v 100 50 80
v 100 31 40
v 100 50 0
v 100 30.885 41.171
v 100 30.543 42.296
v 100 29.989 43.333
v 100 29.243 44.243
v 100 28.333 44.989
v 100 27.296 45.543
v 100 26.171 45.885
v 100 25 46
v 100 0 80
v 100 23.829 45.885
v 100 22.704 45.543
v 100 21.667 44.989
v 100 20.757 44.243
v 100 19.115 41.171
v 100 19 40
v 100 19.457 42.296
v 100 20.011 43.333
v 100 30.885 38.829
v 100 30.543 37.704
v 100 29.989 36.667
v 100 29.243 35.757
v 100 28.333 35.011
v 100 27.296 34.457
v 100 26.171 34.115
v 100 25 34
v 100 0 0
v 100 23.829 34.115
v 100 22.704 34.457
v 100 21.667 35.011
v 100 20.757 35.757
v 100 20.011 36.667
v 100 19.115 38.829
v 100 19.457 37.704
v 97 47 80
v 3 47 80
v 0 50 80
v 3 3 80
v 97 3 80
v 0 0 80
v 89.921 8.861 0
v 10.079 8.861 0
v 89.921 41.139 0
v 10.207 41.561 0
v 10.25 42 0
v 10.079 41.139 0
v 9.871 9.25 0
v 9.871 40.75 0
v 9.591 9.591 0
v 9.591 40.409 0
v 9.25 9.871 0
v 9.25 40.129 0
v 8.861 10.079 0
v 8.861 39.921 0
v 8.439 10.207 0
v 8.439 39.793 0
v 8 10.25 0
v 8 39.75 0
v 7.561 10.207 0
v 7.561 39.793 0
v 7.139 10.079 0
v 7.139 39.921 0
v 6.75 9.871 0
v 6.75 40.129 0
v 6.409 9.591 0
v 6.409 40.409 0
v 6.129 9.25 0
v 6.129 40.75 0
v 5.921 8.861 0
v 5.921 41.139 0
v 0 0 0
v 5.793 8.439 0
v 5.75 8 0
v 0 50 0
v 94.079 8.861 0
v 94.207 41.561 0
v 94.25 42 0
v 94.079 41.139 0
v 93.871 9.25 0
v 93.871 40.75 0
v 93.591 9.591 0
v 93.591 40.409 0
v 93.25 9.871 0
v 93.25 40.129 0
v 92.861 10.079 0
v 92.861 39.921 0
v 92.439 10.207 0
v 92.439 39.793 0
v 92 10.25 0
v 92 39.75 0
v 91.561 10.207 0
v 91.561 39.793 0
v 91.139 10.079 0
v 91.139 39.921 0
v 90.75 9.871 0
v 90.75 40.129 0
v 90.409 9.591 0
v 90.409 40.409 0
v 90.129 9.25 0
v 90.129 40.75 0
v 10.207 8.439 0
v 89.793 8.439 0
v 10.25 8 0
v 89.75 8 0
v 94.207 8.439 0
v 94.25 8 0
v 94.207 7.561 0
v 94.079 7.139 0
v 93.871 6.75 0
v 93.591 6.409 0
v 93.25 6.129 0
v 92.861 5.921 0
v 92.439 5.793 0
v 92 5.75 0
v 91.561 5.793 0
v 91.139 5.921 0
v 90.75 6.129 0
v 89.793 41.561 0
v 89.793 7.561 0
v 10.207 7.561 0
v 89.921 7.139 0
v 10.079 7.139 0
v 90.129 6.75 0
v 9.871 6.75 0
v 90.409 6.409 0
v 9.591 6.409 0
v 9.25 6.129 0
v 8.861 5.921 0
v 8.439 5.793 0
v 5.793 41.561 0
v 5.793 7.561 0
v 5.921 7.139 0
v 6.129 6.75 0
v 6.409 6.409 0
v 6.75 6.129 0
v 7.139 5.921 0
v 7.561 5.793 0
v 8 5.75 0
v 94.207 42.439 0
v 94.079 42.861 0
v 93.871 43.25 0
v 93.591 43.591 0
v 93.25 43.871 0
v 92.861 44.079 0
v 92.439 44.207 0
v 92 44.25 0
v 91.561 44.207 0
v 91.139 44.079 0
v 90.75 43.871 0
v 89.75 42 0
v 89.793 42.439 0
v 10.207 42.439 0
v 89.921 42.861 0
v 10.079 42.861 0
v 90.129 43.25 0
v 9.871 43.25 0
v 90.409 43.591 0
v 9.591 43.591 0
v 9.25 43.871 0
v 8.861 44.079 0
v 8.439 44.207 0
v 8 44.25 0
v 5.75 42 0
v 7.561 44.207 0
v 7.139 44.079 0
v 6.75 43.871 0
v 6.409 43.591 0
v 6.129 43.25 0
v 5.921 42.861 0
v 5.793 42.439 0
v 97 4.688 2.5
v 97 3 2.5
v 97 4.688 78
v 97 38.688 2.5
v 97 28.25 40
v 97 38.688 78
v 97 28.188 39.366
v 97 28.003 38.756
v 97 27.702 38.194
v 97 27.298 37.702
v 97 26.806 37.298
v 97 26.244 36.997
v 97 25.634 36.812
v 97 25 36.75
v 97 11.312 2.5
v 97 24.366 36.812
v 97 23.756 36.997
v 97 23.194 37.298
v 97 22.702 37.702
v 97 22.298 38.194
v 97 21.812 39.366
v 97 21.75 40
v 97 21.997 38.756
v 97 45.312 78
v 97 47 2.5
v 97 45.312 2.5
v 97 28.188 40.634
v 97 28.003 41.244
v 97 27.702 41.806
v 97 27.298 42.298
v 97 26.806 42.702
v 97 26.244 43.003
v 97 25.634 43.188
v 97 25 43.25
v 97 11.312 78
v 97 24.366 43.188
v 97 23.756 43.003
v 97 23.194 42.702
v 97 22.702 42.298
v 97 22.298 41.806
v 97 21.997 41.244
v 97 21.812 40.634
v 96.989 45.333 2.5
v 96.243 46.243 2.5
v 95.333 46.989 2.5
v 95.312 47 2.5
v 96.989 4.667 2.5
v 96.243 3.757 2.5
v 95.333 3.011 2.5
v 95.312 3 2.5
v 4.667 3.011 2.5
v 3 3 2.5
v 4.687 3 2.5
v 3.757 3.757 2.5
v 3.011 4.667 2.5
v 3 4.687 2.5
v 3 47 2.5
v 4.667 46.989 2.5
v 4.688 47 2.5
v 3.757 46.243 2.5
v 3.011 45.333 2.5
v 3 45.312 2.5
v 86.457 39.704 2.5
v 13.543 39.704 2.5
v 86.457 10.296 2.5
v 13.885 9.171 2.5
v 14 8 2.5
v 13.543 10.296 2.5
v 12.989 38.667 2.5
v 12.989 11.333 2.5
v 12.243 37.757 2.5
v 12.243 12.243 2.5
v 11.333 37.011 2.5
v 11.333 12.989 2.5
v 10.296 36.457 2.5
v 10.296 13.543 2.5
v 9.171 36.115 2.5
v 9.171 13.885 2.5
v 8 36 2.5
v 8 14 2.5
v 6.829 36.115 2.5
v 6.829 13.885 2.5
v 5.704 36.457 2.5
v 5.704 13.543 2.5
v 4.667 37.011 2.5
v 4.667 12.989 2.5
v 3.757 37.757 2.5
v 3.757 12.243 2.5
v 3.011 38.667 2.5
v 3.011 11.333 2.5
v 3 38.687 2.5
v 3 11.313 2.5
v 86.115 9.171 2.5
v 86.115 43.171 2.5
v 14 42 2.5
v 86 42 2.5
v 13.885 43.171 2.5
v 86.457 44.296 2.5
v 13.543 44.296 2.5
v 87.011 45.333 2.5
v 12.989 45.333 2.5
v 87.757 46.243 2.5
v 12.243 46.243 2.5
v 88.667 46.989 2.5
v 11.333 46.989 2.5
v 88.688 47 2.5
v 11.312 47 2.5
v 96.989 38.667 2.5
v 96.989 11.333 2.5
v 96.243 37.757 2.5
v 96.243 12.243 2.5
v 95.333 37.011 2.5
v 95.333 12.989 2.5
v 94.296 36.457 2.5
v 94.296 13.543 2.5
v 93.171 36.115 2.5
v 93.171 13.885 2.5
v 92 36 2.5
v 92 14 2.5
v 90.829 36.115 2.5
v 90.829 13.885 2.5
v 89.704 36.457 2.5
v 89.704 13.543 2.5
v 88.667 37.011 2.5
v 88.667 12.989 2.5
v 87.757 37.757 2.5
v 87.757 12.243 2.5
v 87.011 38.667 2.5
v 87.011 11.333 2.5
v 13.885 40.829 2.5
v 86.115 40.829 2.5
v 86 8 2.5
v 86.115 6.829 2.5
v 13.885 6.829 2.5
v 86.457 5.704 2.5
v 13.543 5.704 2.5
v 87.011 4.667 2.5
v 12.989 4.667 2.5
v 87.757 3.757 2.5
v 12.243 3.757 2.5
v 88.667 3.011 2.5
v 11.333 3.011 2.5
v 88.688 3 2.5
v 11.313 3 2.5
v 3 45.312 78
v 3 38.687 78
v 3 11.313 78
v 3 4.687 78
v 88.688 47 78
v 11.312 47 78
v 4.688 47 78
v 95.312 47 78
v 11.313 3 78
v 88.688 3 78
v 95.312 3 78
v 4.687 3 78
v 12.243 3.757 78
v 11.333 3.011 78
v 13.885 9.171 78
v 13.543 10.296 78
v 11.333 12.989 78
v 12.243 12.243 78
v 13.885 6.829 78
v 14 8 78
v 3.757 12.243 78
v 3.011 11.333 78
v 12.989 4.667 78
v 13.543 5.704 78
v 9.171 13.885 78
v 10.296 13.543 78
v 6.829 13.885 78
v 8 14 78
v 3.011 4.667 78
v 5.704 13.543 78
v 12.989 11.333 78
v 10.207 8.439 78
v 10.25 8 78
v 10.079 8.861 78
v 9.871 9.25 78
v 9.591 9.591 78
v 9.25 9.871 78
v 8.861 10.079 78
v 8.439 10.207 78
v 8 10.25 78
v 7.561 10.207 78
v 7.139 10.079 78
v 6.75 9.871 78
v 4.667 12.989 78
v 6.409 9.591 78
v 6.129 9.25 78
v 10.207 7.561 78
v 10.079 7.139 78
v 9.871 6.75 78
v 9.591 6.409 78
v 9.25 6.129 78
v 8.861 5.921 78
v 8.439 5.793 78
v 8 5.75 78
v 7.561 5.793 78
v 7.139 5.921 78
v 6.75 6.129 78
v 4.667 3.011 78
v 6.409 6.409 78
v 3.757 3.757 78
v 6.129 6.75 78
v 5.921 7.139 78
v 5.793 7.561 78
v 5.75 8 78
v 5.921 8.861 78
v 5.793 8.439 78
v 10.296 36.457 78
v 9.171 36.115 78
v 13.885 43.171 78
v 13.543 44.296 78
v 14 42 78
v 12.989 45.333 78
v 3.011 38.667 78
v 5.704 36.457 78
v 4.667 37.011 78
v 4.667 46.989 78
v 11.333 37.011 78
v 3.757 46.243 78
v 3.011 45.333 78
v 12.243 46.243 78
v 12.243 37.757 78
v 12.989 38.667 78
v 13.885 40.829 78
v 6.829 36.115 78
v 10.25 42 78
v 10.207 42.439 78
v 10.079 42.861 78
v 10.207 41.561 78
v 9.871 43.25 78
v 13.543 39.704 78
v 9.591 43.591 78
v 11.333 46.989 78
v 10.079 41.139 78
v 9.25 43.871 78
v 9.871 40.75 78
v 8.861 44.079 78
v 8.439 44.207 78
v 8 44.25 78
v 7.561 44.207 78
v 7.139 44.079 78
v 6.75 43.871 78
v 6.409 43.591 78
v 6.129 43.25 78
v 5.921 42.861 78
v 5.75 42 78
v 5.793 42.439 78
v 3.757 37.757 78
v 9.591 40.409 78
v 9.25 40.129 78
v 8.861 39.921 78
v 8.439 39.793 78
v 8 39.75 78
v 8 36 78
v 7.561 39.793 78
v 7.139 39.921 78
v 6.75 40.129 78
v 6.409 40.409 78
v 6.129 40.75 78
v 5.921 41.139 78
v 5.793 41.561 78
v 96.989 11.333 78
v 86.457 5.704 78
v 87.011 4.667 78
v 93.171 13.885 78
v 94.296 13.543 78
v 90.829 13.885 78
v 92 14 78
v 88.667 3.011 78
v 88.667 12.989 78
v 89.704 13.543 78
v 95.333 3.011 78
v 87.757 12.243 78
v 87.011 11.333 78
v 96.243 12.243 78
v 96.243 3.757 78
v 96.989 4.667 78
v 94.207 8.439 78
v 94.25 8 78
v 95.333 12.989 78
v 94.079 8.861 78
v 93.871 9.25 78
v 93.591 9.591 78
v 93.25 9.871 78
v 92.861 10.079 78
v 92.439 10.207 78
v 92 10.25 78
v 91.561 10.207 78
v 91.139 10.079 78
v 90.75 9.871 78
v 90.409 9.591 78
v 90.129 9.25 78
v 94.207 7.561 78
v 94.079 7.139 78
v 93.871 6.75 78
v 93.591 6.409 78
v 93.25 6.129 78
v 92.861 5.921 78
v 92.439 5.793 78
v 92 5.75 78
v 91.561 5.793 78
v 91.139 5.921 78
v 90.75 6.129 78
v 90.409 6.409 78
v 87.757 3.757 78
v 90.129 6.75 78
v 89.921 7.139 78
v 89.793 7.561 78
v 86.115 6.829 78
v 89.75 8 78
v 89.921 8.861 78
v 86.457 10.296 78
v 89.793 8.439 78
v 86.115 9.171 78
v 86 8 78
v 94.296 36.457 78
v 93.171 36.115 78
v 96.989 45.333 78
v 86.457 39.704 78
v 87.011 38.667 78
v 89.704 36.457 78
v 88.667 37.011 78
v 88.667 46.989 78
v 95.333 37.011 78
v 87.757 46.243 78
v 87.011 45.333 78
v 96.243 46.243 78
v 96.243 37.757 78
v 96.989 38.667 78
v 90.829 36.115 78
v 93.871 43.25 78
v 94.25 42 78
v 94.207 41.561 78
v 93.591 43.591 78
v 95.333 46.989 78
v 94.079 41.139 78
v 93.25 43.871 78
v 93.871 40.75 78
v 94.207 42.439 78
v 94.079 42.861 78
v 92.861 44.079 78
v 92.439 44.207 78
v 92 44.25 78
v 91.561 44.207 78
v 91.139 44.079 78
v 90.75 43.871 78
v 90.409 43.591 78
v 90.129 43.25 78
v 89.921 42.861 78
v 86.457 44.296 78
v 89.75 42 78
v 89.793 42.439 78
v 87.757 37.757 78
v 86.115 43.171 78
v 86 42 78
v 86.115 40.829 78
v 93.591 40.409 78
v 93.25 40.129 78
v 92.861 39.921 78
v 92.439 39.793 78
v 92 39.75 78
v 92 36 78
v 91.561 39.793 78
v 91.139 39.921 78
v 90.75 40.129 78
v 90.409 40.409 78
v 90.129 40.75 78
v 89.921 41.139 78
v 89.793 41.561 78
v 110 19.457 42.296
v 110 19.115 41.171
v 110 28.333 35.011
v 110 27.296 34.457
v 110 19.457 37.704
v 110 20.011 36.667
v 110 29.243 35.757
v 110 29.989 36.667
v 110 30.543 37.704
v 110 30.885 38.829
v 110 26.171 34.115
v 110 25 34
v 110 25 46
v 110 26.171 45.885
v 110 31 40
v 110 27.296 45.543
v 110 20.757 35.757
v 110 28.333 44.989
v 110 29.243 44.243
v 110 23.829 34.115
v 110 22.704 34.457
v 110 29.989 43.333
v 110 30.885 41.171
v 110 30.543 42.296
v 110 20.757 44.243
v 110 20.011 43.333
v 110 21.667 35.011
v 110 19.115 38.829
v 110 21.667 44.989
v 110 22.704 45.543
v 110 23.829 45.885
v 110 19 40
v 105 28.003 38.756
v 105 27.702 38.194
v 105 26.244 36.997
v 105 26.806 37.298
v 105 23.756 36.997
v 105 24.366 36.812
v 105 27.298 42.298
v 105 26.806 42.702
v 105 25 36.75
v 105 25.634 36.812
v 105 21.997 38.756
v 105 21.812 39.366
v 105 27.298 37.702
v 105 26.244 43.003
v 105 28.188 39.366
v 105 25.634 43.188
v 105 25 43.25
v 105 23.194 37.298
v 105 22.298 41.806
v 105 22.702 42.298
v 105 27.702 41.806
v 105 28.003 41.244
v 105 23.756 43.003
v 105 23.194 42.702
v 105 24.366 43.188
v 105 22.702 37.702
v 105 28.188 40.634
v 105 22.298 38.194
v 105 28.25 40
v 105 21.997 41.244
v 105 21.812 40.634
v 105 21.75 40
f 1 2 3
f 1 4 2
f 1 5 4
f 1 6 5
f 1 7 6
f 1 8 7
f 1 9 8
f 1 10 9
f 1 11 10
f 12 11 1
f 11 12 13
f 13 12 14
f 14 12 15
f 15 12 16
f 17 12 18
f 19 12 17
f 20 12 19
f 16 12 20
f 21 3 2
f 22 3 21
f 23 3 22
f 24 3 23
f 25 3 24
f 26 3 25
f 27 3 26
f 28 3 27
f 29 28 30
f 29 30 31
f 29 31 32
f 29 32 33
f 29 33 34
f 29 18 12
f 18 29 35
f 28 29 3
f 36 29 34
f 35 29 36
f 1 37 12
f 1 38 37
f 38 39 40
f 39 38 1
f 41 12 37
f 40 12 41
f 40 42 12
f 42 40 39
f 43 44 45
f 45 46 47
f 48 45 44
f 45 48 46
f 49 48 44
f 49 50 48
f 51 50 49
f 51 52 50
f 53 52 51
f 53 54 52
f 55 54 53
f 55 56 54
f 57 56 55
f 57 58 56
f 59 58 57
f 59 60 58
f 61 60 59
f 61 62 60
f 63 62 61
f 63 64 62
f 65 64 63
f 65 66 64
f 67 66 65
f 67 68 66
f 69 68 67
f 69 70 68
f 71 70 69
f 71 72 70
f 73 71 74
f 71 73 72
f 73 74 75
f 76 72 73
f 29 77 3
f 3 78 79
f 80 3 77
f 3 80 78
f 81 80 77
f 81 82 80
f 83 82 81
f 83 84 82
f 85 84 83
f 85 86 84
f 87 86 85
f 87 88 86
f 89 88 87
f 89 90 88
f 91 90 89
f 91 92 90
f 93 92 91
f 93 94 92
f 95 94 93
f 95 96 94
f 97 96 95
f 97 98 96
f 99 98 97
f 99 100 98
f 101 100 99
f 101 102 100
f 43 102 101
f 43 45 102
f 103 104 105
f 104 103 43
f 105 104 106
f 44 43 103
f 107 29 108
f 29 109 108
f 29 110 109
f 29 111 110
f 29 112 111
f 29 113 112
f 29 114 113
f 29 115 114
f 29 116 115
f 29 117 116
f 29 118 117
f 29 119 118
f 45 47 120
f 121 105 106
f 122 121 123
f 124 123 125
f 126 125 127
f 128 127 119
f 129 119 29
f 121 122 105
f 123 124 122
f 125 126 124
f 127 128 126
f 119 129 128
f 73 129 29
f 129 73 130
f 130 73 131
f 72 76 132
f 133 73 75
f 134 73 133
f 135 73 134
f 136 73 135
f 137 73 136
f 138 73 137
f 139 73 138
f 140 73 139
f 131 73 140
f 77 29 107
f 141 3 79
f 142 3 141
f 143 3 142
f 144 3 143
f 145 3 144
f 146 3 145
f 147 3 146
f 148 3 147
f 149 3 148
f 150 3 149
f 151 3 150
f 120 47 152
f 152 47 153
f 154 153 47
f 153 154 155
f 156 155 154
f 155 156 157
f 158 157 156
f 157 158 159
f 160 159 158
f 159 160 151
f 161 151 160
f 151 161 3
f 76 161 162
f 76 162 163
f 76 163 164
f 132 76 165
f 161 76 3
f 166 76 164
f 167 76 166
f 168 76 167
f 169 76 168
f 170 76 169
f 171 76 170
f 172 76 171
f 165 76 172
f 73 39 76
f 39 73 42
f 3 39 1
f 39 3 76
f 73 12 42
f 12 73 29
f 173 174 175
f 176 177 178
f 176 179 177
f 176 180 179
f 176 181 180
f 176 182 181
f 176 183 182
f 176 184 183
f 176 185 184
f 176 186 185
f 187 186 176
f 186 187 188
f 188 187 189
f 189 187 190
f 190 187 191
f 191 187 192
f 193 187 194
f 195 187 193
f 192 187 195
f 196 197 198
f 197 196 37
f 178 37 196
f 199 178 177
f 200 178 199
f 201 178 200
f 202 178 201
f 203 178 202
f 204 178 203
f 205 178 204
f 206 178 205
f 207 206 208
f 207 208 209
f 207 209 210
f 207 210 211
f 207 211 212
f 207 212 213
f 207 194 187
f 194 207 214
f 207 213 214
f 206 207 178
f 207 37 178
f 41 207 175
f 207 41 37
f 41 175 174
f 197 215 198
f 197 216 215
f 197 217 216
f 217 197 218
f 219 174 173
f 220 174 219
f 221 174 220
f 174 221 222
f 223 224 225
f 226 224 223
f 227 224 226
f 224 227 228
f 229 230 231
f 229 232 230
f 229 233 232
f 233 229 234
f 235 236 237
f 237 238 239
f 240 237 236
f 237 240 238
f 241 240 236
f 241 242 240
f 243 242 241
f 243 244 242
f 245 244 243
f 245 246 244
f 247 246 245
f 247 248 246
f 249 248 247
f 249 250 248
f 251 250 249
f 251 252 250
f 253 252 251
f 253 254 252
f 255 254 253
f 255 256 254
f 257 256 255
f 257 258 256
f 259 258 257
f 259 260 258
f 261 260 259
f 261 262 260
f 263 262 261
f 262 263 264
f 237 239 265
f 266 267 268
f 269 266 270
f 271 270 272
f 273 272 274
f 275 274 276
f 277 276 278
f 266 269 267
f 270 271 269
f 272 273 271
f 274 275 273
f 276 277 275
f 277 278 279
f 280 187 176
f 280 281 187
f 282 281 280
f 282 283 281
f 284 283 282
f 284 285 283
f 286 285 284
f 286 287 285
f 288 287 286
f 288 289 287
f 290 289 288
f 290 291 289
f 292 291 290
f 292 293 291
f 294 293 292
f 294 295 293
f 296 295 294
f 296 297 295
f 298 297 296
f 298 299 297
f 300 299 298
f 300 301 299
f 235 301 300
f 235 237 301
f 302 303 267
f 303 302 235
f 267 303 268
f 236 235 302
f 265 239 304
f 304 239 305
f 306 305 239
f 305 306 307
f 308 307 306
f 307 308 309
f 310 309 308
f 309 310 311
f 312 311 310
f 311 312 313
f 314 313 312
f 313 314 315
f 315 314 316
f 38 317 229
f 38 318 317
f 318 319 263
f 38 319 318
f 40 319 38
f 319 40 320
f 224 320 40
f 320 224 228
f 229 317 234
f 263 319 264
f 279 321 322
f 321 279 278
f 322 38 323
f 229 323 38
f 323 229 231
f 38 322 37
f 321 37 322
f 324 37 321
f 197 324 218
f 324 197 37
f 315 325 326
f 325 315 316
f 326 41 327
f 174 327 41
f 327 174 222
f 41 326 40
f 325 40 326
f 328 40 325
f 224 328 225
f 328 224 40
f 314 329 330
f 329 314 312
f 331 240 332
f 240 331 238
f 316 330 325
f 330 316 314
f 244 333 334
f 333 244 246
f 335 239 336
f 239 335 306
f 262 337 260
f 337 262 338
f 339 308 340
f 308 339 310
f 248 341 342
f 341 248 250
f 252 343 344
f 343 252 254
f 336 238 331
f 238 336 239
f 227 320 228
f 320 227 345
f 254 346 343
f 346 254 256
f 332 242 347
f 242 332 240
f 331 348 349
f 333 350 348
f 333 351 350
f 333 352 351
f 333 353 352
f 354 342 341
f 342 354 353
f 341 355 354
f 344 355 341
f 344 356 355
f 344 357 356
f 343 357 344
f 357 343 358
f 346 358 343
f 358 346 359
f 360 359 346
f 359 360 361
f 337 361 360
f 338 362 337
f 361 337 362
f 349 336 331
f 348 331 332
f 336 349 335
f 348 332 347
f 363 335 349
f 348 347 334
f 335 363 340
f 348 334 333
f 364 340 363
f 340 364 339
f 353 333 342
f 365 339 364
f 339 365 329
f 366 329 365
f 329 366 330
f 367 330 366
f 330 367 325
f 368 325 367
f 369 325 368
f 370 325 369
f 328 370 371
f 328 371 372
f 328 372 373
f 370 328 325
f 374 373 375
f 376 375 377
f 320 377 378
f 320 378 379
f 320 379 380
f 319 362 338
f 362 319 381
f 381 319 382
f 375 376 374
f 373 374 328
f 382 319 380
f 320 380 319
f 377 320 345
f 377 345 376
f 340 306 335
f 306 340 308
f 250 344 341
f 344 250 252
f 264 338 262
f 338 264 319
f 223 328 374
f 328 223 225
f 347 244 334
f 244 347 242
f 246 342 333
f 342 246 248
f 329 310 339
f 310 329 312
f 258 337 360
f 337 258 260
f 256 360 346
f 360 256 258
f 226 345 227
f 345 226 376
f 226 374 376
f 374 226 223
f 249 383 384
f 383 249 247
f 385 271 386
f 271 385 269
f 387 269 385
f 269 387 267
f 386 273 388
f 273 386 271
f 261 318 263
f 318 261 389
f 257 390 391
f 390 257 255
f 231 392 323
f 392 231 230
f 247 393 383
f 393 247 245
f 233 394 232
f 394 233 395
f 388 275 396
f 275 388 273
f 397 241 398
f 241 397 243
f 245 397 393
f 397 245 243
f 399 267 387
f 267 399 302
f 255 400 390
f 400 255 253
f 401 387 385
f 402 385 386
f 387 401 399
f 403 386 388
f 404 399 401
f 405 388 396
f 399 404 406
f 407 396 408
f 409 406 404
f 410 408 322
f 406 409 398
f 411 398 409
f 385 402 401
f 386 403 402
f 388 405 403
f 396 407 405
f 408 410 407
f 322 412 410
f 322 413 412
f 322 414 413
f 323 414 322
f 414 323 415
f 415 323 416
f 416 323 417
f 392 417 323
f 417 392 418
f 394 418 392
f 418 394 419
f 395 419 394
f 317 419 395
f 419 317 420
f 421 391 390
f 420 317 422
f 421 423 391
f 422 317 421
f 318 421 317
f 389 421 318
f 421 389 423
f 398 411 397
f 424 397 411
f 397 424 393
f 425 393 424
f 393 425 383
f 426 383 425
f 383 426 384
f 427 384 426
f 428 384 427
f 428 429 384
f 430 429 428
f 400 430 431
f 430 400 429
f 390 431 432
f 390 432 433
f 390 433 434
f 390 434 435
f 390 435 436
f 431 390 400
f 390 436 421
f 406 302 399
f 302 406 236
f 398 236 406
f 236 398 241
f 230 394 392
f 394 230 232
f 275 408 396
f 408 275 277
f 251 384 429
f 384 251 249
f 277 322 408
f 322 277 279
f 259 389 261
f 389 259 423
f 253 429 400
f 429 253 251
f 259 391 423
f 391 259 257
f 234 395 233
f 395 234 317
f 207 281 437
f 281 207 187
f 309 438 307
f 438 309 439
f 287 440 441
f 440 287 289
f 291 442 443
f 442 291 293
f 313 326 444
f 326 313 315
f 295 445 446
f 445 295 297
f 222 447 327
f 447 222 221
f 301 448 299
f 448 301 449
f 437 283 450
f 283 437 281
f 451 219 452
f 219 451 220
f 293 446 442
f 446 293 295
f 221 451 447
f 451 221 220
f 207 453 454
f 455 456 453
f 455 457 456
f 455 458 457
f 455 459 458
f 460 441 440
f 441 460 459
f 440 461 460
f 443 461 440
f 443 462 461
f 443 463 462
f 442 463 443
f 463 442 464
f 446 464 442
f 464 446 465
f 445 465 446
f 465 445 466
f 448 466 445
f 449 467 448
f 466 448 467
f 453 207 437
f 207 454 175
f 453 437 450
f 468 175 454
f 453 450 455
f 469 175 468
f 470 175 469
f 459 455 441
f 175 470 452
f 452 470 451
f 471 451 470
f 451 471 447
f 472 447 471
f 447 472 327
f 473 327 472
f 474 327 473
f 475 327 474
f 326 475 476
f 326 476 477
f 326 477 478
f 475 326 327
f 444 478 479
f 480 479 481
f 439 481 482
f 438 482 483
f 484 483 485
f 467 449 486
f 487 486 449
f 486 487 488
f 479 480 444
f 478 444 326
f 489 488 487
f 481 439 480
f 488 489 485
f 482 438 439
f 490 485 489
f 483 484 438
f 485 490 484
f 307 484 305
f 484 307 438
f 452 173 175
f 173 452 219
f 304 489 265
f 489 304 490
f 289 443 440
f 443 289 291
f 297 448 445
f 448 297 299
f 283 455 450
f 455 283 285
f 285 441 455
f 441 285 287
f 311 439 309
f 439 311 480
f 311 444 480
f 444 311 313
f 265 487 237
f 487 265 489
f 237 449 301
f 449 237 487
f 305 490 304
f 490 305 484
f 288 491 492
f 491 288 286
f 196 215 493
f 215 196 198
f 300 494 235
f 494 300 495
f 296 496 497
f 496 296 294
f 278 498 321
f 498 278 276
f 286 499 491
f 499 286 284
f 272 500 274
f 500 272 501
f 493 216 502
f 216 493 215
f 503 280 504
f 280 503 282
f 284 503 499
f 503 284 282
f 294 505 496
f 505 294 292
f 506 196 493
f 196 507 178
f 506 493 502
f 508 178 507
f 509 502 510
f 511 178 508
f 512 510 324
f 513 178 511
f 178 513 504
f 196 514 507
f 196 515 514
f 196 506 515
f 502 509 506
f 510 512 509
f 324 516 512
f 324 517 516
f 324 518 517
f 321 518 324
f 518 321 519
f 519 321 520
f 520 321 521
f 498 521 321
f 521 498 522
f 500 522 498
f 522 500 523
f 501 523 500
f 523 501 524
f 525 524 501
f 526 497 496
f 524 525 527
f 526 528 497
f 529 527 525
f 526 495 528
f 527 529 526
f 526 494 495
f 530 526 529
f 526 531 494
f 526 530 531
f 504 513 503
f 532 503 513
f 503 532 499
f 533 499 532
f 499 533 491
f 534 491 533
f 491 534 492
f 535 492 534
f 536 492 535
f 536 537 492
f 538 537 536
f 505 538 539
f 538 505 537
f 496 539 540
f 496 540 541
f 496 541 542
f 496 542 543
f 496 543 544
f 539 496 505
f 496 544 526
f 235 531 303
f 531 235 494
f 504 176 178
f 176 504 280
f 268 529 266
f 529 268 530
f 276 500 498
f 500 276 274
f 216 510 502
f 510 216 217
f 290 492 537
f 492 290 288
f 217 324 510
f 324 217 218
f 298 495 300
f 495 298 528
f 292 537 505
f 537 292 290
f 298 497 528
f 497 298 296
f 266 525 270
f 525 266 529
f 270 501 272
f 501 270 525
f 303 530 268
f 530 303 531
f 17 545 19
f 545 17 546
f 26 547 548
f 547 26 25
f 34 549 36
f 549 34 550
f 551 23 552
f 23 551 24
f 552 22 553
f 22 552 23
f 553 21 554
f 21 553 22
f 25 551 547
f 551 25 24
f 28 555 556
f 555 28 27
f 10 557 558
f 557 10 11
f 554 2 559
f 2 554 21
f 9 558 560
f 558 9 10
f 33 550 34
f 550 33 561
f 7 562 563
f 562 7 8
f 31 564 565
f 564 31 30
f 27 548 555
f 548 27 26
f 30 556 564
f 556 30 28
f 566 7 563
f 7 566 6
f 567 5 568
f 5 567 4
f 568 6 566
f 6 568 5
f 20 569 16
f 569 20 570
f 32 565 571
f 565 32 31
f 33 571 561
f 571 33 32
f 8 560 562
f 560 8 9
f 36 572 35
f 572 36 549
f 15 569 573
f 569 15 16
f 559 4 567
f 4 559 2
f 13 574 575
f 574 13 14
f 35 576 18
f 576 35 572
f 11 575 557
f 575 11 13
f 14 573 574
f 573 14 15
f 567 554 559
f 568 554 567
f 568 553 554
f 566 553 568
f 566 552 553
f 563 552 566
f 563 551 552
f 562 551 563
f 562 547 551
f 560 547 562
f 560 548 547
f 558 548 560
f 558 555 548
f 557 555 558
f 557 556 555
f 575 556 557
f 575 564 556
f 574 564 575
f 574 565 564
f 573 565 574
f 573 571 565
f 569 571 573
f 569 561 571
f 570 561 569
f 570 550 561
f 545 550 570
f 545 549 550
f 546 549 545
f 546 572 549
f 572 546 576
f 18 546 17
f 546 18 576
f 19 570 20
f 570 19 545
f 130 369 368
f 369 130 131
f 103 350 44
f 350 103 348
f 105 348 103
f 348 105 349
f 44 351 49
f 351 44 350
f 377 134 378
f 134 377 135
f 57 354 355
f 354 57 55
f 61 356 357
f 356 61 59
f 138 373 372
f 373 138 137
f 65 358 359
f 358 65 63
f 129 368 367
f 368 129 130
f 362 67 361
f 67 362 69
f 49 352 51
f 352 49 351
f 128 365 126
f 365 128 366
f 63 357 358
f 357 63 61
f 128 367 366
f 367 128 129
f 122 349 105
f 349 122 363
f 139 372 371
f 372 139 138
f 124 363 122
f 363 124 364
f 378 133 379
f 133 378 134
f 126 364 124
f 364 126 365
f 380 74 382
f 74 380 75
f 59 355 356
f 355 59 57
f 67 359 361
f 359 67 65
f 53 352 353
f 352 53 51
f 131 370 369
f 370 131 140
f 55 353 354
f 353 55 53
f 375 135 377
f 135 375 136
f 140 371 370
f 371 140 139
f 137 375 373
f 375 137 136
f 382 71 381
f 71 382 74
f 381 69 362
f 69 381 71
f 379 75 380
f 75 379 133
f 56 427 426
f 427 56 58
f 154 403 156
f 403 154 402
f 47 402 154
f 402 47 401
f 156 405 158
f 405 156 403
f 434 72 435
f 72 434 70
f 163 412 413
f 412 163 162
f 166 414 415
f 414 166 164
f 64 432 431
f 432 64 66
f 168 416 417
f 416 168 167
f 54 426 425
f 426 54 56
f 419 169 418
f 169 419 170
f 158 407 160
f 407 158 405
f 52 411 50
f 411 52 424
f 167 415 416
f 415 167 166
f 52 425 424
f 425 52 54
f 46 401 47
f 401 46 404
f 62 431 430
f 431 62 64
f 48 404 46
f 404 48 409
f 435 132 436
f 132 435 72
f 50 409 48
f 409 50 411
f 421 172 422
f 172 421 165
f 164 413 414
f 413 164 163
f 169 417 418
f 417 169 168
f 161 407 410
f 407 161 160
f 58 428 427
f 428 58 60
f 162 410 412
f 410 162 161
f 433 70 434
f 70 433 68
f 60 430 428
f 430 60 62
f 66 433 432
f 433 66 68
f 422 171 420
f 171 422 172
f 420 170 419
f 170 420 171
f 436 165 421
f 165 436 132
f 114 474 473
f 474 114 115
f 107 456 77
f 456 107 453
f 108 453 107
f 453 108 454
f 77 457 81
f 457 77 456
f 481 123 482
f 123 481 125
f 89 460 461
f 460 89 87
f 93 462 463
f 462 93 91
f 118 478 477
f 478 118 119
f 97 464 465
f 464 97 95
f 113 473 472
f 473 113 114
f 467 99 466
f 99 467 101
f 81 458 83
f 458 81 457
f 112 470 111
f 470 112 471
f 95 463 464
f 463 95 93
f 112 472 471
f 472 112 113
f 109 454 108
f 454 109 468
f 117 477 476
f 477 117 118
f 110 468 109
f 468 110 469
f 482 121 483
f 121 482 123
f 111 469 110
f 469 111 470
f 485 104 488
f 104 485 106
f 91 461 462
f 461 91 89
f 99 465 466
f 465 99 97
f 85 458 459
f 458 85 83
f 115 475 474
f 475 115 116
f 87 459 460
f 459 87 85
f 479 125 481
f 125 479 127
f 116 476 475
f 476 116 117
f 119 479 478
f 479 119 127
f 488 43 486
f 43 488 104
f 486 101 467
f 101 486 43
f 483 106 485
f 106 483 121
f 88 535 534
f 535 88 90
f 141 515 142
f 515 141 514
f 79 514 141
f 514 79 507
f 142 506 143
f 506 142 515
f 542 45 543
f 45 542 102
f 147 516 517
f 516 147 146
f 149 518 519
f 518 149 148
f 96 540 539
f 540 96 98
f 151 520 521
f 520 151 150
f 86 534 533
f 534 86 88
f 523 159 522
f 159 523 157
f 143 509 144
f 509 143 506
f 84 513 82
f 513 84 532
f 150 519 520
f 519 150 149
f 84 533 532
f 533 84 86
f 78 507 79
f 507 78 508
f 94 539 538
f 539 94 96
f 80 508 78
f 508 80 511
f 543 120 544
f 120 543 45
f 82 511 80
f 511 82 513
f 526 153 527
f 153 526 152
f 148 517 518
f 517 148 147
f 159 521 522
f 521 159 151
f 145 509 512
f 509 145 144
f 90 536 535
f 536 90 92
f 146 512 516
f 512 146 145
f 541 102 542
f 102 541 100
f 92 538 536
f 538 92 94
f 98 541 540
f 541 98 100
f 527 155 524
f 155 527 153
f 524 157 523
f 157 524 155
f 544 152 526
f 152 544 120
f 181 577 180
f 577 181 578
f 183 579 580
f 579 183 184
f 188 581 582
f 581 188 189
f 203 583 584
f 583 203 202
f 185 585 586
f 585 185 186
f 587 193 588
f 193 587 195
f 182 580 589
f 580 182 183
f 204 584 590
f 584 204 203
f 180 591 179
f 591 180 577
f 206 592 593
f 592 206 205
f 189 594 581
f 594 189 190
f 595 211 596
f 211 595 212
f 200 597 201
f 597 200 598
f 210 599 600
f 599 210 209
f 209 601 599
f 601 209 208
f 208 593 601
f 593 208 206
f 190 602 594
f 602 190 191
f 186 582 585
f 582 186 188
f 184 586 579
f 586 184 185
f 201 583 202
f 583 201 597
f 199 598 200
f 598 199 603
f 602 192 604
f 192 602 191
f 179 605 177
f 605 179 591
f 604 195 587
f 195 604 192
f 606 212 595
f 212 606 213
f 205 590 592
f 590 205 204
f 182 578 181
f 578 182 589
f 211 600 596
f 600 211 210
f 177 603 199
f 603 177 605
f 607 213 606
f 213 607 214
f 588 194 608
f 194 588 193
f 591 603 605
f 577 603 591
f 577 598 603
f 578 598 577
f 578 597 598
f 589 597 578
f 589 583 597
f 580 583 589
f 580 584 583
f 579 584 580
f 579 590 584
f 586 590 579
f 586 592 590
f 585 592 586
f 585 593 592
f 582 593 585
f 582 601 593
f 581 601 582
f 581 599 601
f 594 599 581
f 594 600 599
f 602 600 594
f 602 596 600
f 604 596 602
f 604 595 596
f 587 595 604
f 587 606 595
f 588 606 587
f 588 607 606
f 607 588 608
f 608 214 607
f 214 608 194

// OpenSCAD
$fn = 32;

// ----------------------------------------------------------------------
// Enclosure body: 100 x 50 x 80 mm, wall 3 mm
// ----------------------------------------------------------------------

// --- parameters (mm) ---
length = 100;             // outside length, X
width = 50;               // outside width, Y
height = 80;              // outside height, Z
wall = 3;                 // side wall thickness
floor_t = 2.5;            // floor thickness
boss_d = 12;              // corner boss diameter
boss_h = 75.5;            // corner boss height above the floor
boss_hole_d = 4.5;        // lid screw clearance in the boss
boss_lip = 8;             // boss centre inset from the corner
nipple_d = 12;            // cable gland boss diameter
nipple_h = 10;            // cable gland boss height
nipple_bore = 6.5;        // cable gland bore

module shell() {
  difference() {
    cube([length, width, height]);
    /* hollow, open at the top */
    translate([wall, wall, floor_t])
      cube([length - 2 * wall, width - 2 * wall, height]);
  }
}

module bosses() {
  /* corner bosses, sunk 1 mm into the floor */
  for (sx = [0, 1]) for (sy = [0, 1])
    translate([sx * (length - 2 * boss_lip) + boss_lip, sy * (width - 2 * boss_lip) + boss_lip, floor_t - 1])
      cylinder(h = boss_h + 1, d = boss_d);
}

module gland() {
  /* boss on the short wall, sunk 1 mm into it */
  translate([length - 1, width / 2, height * 0.5]) rotate([0, 90, 0])
    cylinder(h = nipple_h + 1, d = nipple_d);
}

difference() {
  union() {
    shell();
    bosses();
    gland();
  }
  /* boss screw holes */
  for (sx = [0, 1]) for (sy = [0, 1])
    translate([sx * (length - 2 * boss_lip) + boss_lip, sy * (width - 2 * boss_lip) + boss_lip, -1]) cylinder(h = floor_t + boss_h + 2, d = boss_hole_d);
  translate([length, width / 2, height * 0.5]) rotate([0, 90, 0]) translate([0, 0, -nipple_h - 2]) cylinder(h = nipple_h + wall + 4, d = nipple_bore);
}
